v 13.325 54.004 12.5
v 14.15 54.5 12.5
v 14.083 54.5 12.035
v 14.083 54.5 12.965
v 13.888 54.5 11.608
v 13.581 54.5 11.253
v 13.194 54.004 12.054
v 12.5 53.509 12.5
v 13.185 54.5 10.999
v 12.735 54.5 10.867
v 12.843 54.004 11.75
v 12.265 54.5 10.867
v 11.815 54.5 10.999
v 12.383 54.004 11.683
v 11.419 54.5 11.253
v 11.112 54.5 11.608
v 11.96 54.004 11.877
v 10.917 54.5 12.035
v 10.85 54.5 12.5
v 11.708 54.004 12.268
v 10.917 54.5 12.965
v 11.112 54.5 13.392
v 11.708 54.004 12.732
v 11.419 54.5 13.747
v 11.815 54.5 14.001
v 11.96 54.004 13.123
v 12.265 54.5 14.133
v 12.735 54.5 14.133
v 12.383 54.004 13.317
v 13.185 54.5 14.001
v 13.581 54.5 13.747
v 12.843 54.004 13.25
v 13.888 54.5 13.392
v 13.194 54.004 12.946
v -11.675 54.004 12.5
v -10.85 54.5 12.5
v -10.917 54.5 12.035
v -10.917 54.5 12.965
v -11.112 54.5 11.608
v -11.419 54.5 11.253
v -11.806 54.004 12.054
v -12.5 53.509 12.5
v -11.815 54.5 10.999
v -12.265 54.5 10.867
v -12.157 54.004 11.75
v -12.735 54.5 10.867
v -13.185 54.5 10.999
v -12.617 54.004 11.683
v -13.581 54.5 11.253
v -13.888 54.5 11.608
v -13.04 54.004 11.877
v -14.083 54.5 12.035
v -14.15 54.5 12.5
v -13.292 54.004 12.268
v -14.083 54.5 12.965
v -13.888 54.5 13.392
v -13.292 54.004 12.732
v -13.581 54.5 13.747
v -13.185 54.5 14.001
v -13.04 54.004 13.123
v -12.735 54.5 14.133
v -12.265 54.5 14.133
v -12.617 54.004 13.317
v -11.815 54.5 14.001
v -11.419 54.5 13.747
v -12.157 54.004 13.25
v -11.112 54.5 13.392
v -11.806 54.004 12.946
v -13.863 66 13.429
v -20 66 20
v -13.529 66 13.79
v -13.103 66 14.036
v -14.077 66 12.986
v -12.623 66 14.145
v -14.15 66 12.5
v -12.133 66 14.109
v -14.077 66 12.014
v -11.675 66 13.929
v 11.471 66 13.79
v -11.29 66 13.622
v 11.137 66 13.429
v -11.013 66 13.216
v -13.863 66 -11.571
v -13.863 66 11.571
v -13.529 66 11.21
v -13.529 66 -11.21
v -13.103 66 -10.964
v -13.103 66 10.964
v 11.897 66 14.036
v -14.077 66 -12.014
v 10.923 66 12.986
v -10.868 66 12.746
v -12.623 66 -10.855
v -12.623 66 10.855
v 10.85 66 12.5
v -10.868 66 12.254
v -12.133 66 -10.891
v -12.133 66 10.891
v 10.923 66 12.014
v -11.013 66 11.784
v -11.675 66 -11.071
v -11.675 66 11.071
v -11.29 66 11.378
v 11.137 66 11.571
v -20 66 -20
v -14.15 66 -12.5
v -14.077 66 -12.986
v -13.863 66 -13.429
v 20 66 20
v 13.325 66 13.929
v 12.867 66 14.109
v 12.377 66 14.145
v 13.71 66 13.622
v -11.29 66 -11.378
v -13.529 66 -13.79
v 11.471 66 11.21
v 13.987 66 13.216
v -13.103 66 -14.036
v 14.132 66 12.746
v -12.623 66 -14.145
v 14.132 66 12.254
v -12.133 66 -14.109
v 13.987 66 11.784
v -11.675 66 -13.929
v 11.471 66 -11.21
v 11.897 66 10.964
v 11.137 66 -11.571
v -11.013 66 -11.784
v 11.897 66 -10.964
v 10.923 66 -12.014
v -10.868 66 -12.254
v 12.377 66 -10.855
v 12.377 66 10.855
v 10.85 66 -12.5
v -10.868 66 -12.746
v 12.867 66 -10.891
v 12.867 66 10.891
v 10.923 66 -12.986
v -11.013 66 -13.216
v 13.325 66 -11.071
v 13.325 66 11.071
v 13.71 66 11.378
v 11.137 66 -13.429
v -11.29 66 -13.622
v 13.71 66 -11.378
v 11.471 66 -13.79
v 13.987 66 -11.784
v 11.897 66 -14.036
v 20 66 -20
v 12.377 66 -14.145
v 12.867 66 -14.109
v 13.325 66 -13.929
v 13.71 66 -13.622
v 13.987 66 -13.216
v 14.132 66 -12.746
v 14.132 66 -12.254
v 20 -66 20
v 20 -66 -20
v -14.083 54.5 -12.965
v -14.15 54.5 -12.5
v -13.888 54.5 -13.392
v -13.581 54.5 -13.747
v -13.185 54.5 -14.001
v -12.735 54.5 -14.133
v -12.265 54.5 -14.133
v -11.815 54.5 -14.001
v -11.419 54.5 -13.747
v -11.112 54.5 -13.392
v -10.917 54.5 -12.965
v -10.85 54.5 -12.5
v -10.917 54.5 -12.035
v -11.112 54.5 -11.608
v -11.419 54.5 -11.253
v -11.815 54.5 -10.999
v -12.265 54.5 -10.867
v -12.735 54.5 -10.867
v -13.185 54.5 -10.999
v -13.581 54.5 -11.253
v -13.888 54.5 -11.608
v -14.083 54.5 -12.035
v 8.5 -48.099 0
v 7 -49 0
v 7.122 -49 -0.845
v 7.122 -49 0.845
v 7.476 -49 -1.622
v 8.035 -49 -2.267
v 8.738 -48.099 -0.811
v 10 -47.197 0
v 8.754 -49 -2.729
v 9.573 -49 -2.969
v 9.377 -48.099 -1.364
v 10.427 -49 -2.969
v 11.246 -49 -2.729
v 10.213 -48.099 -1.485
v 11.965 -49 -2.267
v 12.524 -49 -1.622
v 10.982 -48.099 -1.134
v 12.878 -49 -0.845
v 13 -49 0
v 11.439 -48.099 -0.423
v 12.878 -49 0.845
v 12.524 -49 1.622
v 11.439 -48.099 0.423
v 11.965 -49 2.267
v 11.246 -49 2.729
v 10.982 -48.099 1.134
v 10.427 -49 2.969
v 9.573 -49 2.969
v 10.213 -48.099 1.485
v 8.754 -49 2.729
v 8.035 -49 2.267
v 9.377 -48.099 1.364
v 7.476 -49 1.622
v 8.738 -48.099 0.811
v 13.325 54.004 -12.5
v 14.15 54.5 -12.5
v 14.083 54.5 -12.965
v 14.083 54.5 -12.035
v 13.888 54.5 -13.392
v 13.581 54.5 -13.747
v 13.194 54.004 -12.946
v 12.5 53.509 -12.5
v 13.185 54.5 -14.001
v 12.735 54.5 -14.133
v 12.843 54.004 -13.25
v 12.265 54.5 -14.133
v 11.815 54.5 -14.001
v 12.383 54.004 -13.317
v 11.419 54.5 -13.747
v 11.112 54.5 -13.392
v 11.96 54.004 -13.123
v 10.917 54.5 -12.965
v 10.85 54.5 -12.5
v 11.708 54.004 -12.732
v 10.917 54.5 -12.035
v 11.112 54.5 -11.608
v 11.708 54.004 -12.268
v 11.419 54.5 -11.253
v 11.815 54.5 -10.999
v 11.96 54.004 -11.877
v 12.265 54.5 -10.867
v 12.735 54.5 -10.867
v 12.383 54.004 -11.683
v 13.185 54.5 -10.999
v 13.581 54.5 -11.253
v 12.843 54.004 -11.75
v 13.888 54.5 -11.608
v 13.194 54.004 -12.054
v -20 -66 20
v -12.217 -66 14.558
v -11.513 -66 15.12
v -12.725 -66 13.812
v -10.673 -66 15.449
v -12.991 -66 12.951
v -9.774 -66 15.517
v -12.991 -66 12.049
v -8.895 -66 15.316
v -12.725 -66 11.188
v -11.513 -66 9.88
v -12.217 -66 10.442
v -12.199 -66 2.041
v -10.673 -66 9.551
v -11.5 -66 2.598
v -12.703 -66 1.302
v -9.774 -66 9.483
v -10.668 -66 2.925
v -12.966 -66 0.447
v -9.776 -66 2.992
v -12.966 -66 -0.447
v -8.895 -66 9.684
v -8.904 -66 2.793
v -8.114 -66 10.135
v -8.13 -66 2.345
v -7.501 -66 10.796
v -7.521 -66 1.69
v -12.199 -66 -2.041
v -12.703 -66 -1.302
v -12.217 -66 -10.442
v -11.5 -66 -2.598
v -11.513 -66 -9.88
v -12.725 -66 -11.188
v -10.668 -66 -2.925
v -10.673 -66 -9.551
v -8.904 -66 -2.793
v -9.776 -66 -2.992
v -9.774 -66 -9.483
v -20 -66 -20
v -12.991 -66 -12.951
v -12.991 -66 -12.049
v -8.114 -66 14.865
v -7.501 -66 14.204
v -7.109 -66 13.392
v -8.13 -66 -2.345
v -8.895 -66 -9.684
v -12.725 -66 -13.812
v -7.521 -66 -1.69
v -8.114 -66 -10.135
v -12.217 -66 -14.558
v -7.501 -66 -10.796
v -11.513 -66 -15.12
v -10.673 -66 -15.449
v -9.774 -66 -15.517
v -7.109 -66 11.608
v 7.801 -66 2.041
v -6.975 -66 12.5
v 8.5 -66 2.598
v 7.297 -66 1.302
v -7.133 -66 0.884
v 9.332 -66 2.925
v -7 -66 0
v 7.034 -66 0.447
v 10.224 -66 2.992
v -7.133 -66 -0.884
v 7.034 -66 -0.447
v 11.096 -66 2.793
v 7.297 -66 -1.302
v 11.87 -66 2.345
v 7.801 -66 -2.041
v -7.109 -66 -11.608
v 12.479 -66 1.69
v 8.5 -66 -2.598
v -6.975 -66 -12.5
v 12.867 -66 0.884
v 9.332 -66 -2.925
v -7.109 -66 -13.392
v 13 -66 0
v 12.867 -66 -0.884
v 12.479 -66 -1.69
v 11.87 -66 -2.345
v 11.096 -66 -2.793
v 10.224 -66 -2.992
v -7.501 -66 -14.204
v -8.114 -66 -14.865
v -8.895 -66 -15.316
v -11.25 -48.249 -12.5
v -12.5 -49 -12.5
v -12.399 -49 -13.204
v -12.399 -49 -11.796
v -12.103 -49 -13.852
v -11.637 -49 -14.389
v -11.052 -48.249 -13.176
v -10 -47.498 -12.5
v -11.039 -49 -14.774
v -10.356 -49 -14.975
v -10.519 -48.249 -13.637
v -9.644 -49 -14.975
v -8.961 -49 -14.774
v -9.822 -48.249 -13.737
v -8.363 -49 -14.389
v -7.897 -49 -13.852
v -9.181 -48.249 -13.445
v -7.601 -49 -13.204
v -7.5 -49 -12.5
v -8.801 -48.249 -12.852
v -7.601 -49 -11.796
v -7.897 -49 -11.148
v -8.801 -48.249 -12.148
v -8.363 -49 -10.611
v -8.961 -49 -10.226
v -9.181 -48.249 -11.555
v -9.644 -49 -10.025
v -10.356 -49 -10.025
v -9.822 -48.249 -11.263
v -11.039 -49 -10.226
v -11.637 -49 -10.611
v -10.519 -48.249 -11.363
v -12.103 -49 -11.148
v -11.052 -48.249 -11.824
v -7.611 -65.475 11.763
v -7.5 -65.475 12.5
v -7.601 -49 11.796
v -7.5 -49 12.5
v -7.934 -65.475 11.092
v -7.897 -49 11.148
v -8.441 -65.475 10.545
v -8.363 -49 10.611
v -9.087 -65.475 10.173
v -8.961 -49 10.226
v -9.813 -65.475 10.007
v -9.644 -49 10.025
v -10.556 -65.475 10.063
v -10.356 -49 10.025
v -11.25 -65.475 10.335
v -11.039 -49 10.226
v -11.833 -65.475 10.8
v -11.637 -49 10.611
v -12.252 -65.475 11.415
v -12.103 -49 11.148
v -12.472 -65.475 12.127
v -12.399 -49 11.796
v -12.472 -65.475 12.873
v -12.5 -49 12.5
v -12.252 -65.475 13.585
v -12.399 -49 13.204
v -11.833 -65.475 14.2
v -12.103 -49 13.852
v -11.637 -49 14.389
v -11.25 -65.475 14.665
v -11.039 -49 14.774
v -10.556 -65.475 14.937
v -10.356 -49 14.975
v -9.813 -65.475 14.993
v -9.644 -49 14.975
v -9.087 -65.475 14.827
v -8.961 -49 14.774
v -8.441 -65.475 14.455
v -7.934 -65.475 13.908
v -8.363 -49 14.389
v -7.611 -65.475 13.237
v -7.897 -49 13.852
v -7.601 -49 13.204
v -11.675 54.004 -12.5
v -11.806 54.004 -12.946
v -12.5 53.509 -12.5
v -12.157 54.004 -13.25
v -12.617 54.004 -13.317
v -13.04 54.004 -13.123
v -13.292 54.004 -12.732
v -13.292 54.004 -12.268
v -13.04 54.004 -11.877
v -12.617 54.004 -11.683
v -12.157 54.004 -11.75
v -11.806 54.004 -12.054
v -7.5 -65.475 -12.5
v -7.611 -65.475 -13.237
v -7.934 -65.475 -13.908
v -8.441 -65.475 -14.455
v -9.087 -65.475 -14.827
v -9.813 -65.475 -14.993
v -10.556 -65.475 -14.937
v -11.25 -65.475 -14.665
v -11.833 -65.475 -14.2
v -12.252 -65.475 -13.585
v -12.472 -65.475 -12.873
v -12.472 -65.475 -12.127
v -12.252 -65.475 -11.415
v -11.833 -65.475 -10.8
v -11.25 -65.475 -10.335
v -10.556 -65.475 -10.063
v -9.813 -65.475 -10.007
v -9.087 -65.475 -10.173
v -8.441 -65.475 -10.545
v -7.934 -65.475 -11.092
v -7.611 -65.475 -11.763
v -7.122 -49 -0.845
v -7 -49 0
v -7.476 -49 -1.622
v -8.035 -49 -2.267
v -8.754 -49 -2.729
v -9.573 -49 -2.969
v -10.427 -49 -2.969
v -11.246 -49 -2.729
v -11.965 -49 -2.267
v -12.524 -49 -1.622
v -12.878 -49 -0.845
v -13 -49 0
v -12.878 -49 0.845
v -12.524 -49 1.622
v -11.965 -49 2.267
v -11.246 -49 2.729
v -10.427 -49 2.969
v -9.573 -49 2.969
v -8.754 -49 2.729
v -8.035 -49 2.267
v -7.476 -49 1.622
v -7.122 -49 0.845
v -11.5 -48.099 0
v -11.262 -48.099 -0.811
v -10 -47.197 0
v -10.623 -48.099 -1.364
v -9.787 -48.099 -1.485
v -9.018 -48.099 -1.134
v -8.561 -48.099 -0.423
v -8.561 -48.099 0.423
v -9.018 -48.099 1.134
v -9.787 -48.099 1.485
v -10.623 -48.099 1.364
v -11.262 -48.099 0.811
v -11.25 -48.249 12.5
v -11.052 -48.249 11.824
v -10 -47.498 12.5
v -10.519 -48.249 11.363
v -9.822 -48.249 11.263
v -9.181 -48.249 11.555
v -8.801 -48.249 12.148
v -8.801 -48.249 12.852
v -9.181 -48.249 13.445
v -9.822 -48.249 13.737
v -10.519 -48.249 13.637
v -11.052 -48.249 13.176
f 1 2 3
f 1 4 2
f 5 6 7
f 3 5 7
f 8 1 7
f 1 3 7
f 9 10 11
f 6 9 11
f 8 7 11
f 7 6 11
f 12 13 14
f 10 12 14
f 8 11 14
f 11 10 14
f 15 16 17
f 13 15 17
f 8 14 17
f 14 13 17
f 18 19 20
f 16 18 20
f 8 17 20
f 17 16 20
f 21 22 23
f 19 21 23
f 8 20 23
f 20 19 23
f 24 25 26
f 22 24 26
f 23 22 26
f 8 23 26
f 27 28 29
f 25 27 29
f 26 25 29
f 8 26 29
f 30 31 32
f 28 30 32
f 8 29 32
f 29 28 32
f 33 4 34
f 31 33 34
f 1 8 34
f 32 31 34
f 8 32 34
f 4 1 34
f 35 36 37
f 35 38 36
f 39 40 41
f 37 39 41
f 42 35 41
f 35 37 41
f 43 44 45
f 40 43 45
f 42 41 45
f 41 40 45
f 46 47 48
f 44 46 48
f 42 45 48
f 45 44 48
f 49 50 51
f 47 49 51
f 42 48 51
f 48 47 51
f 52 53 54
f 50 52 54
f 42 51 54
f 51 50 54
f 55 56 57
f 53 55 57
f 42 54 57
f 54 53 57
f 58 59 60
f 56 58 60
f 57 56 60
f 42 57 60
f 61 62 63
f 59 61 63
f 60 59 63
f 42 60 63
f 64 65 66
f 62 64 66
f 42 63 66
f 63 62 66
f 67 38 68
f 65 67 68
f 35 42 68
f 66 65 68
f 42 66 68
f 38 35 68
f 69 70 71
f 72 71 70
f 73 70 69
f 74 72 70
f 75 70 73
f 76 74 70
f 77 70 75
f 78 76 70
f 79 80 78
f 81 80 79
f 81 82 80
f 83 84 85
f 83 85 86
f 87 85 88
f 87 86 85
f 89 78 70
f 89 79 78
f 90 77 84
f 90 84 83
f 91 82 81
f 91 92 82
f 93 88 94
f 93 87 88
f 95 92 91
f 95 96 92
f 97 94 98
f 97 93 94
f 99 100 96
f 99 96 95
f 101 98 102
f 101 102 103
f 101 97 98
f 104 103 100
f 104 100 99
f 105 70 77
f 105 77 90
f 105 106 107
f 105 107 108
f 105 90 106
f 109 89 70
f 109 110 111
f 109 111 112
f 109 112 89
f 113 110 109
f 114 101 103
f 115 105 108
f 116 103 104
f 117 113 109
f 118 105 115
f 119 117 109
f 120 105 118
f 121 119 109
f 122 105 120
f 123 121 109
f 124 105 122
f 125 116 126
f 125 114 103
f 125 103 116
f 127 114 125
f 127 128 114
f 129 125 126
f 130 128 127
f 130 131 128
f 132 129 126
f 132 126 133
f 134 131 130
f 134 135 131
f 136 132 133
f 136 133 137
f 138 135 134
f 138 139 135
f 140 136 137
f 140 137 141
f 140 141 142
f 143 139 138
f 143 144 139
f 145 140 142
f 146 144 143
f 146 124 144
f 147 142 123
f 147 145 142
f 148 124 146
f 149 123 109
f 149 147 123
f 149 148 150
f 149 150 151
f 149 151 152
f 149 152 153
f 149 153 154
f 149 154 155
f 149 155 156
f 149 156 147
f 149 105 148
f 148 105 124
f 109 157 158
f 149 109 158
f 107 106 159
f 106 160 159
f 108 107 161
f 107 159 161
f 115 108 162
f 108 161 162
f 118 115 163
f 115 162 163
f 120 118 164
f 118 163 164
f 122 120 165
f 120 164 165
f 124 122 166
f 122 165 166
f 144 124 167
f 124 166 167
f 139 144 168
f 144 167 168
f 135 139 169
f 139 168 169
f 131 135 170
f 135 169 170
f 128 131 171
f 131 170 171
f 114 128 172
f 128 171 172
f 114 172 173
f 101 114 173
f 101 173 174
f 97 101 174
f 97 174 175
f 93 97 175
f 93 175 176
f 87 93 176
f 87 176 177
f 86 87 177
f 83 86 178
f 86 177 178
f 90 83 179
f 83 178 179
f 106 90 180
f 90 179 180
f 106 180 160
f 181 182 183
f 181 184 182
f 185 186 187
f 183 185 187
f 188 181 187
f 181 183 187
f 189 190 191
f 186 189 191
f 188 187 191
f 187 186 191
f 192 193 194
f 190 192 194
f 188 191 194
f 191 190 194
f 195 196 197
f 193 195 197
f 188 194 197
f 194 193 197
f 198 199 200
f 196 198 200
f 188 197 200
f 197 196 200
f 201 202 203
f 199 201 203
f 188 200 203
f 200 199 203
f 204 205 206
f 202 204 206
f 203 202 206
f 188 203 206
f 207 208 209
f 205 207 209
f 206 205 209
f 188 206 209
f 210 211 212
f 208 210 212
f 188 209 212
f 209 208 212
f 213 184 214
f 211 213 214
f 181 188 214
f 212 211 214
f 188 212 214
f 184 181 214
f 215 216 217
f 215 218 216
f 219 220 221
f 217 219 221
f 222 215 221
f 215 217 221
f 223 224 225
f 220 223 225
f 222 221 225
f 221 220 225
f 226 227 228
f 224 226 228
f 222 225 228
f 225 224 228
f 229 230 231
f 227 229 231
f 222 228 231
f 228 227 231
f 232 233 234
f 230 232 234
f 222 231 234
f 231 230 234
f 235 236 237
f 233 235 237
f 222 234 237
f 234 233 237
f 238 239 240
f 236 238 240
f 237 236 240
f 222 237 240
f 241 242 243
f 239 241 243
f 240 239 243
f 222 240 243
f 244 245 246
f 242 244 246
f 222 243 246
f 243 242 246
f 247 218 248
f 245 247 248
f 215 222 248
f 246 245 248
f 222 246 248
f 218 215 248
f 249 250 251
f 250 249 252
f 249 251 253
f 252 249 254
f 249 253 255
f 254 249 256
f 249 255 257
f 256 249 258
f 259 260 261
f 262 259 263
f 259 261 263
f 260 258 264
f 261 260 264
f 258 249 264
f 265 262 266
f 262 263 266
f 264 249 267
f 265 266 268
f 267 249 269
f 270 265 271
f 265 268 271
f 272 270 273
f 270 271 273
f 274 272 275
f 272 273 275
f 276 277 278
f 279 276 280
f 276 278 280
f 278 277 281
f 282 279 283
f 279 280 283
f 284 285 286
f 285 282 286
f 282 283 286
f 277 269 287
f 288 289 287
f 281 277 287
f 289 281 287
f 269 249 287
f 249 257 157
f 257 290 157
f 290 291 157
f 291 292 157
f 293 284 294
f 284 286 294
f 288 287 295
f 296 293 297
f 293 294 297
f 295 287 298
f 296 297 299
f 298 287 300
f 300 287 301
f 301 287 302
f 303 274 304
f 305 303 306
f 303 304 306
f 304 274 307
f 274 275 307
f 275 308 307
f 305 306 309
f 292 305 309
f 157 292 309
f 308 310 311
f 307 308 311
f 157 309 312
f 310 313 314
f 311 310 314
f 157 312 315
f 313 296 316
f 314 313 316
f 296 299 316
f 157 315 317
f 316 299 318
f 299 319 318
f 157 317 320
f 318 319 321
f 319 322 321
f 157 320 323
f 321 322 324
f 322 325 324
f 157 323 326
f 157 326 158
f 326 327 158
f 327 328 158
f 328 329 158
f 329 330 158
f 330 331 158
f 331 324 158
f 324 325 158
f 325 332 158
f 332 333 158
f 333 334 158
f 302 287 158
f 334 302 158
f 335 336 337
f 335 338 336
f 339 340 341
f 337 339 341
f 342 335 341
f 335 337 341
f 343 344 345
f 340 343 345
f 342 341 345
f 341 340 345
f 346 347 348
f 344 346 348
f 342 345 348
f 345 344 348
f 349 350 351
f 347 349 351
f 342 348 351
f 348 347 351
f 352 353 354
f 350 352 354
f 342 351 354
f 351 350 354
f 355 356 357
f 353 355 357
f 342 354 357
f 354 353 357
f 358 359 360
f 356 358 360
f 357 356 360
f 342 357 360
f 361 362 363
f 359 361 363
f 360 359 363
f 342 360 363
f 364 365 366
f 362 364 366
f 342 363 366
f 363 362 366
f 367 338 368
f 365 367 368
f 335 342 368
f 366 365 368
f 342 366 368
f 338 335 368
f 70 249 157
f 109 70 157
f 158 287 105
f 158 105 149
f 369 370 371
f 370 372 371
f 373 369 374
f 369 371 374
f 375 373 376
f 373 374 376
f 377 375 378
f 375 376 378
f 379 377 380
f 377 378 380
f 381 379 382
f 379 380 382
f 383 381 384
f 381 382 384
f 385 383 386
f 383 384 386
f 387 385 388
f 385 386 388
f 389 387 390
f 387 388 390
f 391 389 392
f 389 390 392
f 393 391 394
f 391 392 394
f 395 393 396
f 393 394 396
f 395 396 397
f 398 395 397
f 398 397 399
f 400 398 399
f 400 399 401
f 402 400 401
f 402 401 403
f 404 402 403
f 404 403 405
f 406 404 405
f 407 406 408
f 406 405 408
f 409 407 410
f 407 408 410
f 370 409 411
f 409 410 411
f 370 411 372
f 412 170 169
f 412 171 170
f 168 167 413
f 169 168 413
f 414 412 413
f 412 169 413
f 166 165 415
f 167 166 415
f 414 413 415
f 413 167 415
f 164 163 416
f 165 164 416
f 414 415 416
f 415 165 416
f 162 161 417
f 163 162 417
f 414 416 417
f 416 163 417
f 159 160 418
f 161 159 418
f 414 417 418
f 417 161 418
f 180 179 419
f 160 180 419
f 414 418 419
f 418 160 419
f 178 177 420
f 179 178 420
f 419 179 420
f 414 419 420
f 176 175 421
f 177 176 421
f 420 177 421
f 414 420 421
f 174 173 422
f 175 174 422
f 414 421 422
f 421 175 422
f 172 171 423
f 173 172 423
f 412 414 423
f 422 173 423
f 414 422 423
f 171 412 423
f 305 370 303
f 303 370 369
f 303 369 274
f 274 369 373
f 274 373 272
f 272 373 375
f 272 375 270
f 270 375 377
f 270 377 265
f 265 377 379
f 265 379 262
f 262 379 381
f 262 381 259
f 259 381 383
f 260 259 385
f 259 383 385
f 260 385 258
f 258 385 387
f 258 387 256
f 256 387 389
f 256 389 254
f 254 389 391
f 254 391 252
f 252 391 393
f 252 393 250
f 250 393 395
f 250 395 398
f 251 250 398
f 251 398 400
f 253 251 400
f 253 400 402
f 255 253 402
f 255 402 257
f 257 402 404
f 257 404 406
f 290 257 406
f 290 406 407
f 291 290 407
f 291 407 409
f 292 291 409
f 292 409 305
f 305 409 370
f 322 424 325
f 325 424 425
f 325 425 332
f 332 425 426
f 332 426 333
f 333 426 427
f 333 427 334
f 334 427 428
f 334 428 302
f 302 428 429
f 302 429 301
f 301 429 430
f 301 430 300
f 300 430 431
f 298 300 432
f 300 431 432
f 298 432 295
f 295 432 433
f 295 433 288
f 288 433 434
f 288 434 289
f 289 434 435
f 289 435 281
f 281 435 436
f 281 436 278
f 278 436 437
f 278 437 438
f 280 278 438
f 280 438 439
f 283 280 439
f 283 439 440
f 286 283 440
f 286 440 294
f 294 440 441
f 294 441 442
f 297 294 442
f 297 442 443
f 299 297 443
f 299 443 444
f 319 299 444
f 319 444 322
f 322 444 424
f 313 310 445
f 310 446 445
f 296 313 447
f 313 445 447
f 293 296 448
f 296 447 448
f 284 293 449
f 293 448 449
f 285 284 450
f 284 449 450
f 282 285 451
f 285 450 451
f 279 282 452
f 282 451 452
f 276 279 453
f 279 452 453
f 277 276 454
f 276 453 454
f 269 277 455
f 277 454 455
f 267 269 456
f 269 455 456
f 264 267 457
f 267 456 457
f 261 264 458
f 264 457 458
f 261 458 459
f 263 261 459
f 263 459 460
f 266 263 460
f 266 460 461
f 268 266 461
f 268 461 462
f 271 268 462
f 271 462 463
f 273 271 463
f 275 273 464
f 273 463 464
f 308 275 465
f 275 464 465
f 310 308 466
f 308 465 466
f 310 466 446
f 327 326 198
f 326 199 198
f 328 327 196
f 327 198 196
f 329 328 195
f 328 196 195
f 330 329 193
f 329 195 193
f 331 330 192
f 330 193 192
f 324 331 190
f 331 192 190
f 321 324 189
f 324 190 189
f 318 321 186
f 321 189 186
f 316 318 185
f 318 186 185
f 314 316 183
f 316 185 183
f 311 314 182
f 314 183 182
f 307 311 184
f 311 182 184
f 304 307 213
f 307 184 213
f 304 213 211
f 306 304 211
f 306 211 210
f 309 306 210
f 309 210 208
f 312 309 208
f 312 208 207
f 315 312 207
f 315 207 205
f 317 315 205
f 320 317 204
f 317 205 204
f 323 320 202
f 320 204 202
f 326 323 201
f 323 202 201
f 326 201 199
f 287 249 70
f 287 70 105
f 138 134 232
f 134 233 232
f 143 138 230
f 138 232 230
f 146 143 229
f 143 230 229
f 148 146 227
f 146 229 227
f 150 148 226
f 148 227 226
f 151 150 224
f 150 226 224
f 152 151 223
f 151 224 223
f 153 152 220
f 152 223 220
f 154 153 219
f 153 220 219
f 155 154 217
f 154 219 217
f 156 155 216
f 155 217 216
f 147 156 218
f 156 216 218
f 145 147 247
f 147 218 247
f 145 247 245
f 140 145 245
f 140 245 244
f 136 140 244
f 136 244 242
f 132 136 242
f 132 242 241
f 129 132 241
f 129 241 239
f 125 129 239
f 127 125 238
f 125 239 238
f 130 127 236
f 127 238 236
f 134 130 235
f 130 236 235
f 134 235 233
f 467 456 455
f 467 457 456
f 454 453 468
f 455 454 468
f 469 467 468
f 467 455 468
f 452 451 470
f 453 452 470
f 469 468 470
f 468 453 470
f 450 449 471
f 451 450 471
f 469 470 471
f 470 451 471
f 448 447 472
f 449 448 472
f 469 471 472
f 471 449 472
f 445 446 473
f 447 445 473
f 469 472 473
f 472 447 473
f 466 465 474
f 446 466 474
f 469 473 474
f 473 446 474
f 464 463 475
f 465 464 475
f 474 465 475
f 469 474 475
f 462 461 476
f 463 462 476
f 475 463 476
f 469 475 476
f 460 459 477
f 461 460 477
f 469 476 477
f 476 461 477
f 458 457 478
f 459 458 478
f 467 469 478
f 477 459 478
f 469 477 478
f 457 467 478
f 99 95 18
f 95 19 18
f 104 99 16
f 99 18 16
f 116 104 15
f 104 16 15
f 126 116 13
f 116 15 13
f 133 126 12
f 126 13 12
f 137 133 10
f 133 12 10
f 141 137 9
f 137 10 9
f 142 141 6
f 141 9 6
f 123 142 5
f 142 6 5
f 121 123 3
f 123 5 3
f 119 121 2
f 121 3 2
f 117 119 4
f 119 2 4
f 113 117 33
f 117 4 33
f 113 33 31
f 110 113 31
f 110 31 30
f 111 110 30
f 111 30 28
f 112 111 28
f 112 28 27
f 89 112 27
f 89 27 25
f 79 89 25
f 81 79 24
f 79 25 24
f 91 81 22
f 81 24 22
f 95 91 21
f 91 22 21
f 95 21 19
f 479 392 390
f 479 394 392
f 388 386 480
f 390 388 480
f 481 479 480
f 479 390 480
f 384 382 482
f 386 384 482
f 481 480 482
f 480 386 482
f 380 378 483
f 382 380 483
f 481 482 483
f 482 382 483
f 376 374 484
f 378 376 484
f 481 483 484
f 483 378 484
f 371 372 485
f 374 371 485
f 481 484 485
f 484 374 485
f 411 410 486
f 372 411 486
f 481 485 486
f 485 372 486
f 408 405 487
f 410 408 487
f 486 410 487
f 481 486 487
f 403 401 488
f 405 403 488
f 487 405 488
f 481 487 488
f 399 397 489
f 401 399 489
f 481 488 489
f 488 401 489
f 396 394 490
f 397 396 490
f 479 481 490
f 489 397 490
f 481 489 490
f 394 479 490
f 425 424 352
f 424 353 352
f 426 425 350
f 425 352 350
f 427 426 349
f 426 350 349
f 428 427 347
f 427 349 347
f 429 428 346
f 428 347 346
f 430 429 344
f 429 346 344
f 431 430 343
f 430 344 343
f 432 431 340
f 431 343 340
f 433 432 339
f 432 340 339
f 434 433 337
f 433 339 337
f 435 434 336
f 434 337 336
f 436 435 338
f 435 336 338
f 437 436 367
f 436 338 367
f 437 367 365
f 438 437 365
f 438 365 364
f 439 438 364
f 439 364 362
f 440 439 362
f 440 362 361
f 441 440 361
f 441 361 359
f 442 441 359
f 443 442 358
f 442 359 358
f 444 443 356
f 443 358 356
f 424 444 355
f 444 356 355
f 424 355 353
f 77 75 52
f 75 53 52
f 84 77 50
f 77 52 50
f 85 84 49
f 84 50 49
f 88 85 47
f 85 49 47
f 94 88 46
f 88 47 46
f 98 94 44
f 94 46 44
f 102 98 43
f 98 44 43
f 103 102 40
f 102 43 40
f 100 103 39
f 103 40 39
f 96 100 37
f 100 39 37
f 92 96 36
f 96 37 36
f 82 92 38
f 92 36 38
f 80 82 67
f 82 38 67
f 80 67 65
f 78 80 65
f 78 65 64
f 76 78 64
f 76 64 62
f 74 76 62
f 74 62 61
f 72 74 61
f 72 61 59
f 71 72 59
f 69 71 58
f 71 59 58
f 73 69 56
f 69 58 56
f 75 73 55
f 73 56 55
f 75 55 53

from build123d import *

# Parameters (mm, degrees)
SKIZZE1_W                       = 40
SKIZZE1_H                       = 40
AUFSATZ_LINEAR_AUSTRAGEN1_DEPTH = 66
M4_GEWINDEBOHRUNG1_D            = 3.3
M4_GEWINDEBOHRUNG1_DEPTH        = 11.5
M4_GEWINDEBOHRUNG1_TIP          = 0.991420021
M6_GEWINDEBOHRUNG1_D            = 5
M6_GEWINDEBOHRUNG1_DEPTH        = 17
M6_GEWINDEBOHRUNG1_CSINK_D      = 6.05
M6_GEWINDEBOHRUNG1_CSINK_ANGLE  = 90
M6_GEWINDEBOHRUNG1_TIP          = 1.502151548
F_6_0MM_STIFTLOCH1_D            = 6
F_6_0MM_STIFTLOCH1_DEPTH        = 17
F_6_0MM_STIFTLOCH1_TIP          = 1.802581857


with BuildPart() as part:
    # Skizze1 → Aufsatz-Linear austragen1 (new, symmetric)
    with BuildSketch(Plane(origin=(0, 0, 0), x_dir=(1, 0, 0), z_dir=(0, 1, 0))):
        Rectangle(SKIZZE1_W, SKIZZE1_H)
    extrude(amount=AUFSATZ_LINEAR_AUSTRAGEN1_DEPTH, both=True)

    # M4 Gewindebohrung1
    with Locations(Plane(origin=(0, 66, 0), x_dir=(1, 0, 0), z_dir=(0, 1, 0))):
        with Locations((-12.5, 12.5), (12.5, 12.5), (12.5, -12.5), (-12.5, -12.5)):
            Hole(M4_GEWINDEBOHRUNG1_D / 2, depth=M4_GEWINDEBOHRUNG1_DEPTH)
            with Locations((0, 0, -(M4_GEWINDEBOHRUNG1_DEPTH + M4_GEWINDEBOHRUNG1_TIP / 2))):  # 118° drill point
                Cone(0, M4_GEWINDEBOHRUNG1_D / 2, M4_GEWINDEBOHRUNG1_TIP, mode=Mode.SUBTRACT)

    # M6 Gewindebohrung1
    with Locations(Plane(origin=(0, -66, 0), x_dir=(-1, 0, 0), z_dir=(0, -1, 0))):
        with Locations((10, 12.5), (10, -12.5)):
            CounterSinkHole(M6_GEWINDEBOHRUNG1_D / 2, M6_GEWINDEBOHRUNG1_CSINK_D / 2, depth=M6_GEWINDEBOHRUNG1_DEPTH, counter_sink_angle=M6_GEWINDEBOHRUNG1_CSINK_ANGLE)
            with Locations((0, 0, -(M6_GEWINDEBOHRUNG1_DEPTH + M6_GEWINDEBOHRUNG1_TIP / 2))):  # 118° drill point
                Cone(0, M6_GEWINDEBOHRUNG1_D / 2, M6_GEWINDEBOHRUNG1_TIP, mode=Mode.SUBTRACT)

    # Ø6.0mm Stiftloch1
    with Locations(Plane(origin=(0, -66, 0), x_dir=(-1, 0, 0), z_dir=(0, -1, 0))):
        with Locations((10, 0), (-10, 0)):
            Hole(F_6_0MM_STIFTLOCH1_D / 2, depth=F_6_0MM_STIFTLOCH1_DEPTH)
            with Locations((0, 0, -(F_6_0MM_STIFTLOCH1_DEPTH + F_6_0MM_STIFTLOCH1_TIP / 2))):  # 118° drill point
                Cone(0, F_6_0MM_STIFTLOCH1_D / 2, F_6_0MM_STIFTLOCH1_TIP, mode=Mode.SUBTRACT)


solid = part.part
